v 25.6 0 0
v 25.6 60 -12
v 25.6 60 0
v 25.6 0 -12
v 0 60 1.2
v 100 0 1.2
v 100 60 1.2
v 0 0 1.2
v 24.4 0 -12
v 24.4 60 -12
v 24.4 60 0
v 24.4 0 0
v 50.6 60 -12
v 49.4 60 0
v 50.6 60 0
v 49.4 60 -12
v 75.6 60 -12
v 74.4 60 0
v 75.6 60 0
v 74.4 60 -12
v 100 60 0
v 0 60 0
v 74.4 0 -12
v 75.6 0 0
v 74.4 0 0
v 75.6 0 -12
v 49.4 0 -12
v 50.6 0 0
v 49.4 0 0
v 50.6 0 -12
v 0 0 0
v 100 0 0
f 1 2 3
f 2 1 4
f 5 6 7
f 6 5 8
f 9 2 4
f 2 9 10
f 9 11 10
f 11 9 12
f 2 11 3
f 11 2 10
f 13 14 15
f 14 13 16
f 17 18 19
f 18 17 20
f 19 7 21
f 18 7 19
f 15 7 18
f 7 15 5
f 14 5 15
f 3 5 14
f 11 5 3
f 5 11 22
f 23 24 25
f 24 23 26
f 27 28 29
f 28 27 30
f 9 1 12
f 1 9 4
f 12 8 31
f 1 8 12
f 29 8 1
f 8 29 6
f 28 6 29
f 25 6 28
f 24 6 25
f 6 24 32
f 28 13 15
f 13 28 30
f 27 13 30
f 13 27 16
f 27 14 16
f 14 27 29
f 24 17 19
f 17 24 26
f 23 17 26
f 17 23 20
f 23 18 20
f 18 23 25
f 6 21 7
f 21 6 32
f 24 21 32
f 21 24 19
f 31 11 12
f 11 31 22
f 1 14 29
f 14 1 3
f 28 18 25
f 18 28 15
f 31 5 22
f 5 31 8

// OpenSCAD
$fn = 32;

// ----------------------------------------------------------------------
// Ribbed panel: 1.2 mm panel
// ----------------------------------------------------------------------

// --- parameters (mm) ---
panel_l = 100;            // panel length, X
panel_w = 60;             // panel width, Y
panel_t = 1.2;            // panel thickness, Z
rib_t = 1.2;              // rib thickness
rib_h = 12;               // rib height below the panel
ribs = 3;                 // number of ribs

total_h = panel_t + rib_h;  // overall height

union() {
  cube([panel_l, panel_w, panel_t]);
  for (i = [1 : ribs])
    translate([i * panel_l / (ribs + 1) - rib_t / 2, 0, -rib_h])
      cube([rib_t, panel_w, rib_h + panel_t]);
}
